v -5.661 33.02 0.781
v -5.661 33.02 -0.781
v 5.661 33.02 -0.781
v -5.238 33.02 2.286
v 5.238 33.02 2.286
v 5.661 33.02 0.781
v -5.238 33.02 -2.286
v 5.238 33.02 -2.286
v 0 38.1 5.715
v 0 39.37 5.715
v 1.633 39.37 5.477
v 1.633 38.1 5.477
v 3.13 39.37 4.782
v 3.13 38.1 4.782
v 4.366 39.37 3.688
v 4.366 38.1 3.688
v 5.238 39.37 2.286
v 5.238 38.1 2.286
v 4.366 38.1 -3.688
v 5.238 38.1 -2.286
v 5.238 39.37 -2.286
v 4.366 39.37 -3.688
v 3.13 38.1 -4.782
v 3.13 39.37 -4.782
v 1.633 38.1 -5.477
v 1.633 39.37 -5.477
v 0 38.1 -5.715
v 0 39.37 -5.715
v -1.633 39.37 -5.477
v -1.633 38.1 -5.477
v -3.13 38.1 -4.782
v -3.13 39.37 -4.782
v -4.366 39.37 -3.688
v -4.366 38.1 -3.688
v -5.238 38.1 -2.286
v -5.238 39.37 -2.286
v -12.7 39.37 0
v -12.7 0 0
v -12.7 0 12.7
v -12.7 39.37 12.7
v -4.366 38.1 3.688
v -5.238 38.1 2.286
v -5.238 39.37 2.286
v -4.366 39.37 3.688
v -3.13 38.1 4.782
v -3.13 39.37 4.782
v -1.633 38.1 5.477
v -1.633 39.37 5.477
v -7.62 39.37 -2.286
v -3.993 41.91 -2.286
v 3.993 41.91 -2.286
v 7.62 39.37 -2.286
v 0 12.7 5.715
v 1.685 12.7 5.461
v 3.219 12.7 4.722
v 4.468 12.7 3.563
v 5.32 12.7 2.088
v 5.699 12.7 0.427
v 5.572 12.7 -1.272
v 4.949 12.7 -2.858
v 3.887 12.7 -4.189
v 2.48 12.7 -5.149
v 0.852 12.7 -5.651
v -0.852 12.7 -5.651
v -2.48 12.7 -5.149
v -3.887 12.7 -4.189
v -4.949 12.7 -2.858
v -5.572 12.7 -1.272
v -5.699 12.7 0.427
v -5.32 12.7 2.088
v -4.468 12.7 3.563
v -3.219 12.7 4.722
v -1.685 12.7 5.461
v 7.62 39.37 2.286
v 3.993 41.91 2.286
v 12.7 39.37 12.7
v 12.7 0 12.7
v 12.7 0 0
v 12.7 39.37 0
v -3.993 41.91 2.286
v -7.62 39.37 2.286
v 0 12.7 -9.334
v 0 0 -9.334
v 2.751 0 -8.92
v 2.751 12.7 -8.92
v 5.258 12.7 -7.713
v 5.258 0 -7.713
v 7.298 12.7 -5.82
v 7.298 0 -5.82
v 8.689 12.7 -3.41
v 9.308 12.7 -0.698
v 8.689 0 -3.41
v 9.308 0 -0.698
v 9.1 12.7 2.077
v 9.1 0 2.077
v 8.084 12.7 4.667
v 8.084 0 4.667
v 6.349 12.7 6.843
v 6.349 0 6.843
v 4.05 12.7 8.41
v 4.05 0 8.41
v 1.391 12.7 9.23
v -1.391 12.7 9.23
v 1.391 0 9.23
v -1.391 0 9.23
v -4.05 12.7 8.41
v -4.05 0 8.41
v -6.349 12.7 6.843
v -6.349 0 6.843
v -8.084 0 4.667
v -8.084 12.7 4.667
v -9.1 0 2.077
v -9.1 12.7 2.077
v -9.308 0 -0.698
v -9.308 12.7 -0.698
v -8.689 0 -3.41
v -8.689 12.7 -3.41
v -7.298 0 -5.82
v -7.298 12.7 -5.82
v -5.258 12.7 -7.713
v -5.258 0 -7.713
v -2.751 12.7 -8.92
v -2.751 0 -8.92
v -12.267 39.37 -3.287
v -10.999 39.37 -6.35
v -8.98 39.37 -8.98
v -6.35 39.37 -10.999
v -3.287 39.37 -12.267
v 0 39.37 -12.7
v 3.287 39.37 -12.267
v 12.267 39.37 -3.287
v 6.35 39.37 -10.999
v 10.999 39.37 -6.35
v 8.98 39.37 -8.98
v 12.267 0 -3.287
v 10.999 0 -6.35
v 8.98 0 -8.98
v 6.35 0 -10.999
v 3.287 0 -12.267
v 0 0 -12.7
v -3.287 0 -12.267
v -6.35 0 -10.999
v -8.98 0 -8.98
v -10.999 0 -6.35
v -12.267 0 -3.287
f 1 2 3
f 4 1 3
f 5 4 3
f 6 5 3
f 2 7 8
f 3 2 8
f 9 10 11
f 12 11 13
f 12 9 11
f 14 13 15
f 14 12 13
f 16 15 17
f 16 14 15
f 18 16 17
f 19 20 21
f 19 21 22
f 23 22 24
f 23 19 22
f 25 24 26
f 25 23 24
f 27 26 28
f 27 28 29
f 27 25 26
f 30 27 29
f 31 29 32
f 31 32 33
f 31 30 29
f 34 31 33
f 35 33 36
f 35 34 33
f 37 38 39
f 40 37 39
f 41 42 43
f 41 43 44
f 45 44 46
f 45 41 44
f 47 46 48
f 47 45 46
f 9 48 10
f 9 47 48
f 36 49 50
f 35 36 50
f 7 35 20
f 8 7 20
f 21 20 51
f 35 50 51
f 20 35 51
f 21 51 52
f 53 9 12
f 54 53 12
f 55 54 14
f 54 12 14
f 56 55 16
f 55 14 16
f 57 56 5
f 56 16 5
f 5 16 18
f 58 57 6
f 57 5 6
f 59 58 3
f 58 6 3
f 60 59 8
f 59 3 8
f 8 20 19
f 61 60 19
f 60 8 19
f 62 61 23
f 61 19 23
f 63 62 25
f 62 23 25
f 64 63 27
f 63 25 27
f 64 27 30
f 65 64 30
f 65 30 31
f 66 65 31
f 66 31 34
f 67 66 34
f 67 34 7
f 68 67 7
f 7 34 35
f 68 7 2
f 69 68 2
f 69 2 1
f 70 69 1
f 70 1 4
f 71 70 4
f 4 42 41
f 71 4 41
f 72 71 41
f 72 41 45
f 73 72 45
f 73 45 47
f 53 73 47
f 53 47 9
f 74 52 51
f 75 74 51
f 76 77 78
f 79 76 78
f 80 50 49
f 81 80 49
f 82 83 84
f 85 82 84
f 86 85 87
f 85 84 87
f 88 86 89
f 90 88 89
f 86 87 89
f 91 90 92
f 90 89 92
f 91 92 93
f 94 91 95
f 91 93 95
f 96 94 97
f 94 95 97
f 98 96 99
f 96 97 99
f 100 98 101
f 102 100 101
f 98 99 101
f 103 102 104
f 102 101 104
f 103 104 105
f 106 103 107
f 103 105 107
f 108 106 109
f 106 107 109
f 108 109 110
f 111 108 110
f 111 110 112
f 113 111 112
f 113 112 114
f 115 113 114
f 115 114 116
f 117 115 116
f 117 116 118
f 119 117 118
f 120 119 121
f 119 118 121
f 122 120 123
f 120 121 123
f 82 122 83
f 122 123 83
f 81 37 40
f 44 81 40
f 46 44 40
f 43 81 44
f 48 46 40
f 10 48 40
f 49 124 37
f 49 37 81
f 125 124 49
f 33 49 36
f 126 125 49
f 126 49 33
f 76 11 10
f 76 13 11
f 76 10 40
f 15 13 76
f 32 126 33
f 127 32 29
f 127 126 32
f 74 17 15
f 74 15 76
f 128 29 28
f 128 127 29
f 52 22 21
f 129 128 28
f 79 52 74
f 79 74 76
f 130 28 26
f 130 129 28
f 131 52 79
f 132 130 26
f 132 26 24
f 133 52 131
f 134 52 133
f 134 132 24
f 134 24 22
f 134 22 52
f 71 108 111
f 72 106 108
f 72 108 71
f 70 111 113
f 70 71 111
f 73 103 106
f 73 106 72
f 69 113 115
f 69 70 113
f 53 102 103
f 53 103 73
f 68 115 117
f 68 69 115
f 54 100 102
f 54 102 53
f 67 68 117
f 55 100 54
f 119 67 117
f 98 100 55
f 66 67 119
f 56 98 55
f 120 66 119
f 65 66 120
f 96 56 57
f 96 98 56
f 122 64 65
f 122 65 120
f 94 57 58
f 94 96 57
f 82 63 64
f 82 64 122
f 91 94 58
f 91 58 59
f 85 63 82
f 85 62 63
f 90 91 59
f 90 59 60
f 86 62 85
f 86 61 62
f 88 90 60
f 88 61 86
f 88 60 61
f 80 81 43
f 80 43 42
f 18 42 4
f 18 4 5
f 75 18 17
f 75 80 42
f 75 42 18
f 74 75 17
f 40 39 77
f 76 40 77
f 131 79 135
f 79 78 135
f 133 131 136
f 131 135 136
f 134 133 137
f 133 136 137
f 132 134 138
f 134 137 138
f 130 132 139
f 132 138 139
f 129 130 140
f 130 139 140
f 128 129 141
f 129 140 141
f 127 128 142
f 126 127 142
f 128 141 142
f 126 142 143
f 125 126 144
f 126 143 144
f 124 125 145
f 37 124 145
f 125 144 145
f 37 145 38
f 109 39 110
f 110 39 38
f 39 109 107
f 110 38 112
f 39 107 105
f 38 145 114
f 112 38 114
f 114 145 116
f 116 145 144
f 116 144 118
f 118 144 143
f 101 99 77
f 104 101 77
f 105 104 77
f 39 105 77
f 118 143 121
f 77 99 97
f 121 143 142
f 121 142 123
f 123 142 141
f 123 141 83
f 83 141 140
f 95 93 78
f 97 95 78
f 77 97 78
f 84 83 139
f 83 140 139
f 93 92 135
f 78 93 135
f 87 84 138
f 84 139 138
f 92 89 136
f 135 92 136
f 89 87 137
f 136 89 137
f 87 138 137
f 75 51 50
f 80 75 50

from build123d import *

# Parameters (mm, degrees)
SKETCH1_R           = 12.7
BOSS_EXTRUDE1_DEPTH = 38.1
SKETCH2_R           = 5.715
CUT_EXTRUDE1_DEPTH  = 43.121134838
SKETCH3_R           = 9.3345
CUT_EXTRUDE2_DEPTH  = 12.7
SKETCH4_R           = 12.7
SKETCH4_R_2         = 5.715
BOSS_EXTRUDE2_DEPTH = 1.27
SKETCH5_W           = 11.43
SKETCH5_H           = 4.572
BOSS_EXTRUDE3_DEPTH = 6.35
BOSS_EXTRUDE4_DEPTH = 4.572
BOSS_EXTRUDE5_START = -39.37
BOSS_EXTRUDE5_DEPTH = 39.37


with BuildPart() as part:
    # Sketch1 → Boss-Extrude1 (new body)
    with BuildSketch(Plane(origin=(0, 0, 0), x_dir=(1, 0, 0), z_dir=(0, 1, 0))):
        with Locations(Location((0, 0, 0), (0, 0, 90))):
            Circle(SKETCH1_R)
    extrude(amount=BOSS_EXTRUDE1_DEPTH)

    # Sketch2 → Cut-Extrude1 (cut, through all)
    with BuildSketch(Plane(origin=(0, 38.1, 0), x_dir=(1, 0, 0), z_dir=(0, 1, 0))):
        with Locations(Location((0, 0, 0), (0, 0, 270))):
            Circle(SKETCH2_R)
    extrude(amount=-CUT_EXTRUDE1_DEPTH, mode=Mode.SUBTRACT)

    # Sketch3 → Cut-Extrude2 (cut)
    with BuildSketch(Plane.XZ):
        with Locations(Location((0, 0, 0), (0, 0, 270))):
            Circle(SKETCH3_R)
    extrude(amount=-CUT_EXTRUDE2_DEPTH, mode=Mode.SUBTRACT)

    # Sketch4 → Boss-Extrude2 (add)
    with BuildSketch(Plane(origin=(0, 38.1, 0), x_dir=(1, 0, 0), z_dir=(0, 1, 0))):
        with Locations(Location((0, 0, 0), (0, 0, 90))):
            Circle(SKETCH4_R)
        with Locations(Location((0, 0, 0), (0, 0, 270))):
            Circle(SKETCH4_R_2, mode=Mode.SUBTRACT)
    extrude(amount=BOSS_EXTRUDE2_DEPTH)

    # Sketch5 → Boss-Extrude3 (add)
    with BuildSketch(Plane(origin=(0, 39.37, 0), x_dir=(1, 0, 0), z_dir=(0, 1, 0))):
        Rectangle(SKETCH5_W, SKETCH5_H)
    extrude(amount=-BOSS_EXTRUDE3_DEPTH)

    # Sketch6 → Boss-Extrude4 (add)
    with BuildSketch(Plane(origin=(0, 0, -2.286), x_dir=(-1, 0, 0), z_dir=(0, 0, -1))):
        Polygon((7.62, 39.37), (-7.62, 39.37), (-3.992504063, 41.91), (3.992504063, 41.91), align=None)
    extrude(amount=-BOSS_EXTRUDE4_DEPTH)

    # Sketch7 → Boss-Extrude5 (add)
    with BuildSketch(Plane(origin=(0, 39.37, 0), x_dir=(1, 0, 0), z_dir=(0, 1, 0)).offset(BOSS_EXTRUDE5_START)):
        with BuildLine():
            ThreePointArc((12.7, 0), (8.980256115, -8.980256127), (-1.7e-08, -12.7))
            Line((-1.7e-08, -12.7), (12.7, -12.7))
            Line((12.7, -12.7), (12.7, 0))
        make_face()
        with BuildLine():
            ThreePointArc((-1.7e-08, -12.7), (-8.980256127, -8.980256115), (-12.7, 0))
            Line((-12.7, 0), (-12.7, -12.7))
            Line((-12.7, -12.7), (-1.7e-08, -12.7))
        make_face()
    extrude(amount=BOSS_EXTRUDE5_DEPTH)


solid = part.part
